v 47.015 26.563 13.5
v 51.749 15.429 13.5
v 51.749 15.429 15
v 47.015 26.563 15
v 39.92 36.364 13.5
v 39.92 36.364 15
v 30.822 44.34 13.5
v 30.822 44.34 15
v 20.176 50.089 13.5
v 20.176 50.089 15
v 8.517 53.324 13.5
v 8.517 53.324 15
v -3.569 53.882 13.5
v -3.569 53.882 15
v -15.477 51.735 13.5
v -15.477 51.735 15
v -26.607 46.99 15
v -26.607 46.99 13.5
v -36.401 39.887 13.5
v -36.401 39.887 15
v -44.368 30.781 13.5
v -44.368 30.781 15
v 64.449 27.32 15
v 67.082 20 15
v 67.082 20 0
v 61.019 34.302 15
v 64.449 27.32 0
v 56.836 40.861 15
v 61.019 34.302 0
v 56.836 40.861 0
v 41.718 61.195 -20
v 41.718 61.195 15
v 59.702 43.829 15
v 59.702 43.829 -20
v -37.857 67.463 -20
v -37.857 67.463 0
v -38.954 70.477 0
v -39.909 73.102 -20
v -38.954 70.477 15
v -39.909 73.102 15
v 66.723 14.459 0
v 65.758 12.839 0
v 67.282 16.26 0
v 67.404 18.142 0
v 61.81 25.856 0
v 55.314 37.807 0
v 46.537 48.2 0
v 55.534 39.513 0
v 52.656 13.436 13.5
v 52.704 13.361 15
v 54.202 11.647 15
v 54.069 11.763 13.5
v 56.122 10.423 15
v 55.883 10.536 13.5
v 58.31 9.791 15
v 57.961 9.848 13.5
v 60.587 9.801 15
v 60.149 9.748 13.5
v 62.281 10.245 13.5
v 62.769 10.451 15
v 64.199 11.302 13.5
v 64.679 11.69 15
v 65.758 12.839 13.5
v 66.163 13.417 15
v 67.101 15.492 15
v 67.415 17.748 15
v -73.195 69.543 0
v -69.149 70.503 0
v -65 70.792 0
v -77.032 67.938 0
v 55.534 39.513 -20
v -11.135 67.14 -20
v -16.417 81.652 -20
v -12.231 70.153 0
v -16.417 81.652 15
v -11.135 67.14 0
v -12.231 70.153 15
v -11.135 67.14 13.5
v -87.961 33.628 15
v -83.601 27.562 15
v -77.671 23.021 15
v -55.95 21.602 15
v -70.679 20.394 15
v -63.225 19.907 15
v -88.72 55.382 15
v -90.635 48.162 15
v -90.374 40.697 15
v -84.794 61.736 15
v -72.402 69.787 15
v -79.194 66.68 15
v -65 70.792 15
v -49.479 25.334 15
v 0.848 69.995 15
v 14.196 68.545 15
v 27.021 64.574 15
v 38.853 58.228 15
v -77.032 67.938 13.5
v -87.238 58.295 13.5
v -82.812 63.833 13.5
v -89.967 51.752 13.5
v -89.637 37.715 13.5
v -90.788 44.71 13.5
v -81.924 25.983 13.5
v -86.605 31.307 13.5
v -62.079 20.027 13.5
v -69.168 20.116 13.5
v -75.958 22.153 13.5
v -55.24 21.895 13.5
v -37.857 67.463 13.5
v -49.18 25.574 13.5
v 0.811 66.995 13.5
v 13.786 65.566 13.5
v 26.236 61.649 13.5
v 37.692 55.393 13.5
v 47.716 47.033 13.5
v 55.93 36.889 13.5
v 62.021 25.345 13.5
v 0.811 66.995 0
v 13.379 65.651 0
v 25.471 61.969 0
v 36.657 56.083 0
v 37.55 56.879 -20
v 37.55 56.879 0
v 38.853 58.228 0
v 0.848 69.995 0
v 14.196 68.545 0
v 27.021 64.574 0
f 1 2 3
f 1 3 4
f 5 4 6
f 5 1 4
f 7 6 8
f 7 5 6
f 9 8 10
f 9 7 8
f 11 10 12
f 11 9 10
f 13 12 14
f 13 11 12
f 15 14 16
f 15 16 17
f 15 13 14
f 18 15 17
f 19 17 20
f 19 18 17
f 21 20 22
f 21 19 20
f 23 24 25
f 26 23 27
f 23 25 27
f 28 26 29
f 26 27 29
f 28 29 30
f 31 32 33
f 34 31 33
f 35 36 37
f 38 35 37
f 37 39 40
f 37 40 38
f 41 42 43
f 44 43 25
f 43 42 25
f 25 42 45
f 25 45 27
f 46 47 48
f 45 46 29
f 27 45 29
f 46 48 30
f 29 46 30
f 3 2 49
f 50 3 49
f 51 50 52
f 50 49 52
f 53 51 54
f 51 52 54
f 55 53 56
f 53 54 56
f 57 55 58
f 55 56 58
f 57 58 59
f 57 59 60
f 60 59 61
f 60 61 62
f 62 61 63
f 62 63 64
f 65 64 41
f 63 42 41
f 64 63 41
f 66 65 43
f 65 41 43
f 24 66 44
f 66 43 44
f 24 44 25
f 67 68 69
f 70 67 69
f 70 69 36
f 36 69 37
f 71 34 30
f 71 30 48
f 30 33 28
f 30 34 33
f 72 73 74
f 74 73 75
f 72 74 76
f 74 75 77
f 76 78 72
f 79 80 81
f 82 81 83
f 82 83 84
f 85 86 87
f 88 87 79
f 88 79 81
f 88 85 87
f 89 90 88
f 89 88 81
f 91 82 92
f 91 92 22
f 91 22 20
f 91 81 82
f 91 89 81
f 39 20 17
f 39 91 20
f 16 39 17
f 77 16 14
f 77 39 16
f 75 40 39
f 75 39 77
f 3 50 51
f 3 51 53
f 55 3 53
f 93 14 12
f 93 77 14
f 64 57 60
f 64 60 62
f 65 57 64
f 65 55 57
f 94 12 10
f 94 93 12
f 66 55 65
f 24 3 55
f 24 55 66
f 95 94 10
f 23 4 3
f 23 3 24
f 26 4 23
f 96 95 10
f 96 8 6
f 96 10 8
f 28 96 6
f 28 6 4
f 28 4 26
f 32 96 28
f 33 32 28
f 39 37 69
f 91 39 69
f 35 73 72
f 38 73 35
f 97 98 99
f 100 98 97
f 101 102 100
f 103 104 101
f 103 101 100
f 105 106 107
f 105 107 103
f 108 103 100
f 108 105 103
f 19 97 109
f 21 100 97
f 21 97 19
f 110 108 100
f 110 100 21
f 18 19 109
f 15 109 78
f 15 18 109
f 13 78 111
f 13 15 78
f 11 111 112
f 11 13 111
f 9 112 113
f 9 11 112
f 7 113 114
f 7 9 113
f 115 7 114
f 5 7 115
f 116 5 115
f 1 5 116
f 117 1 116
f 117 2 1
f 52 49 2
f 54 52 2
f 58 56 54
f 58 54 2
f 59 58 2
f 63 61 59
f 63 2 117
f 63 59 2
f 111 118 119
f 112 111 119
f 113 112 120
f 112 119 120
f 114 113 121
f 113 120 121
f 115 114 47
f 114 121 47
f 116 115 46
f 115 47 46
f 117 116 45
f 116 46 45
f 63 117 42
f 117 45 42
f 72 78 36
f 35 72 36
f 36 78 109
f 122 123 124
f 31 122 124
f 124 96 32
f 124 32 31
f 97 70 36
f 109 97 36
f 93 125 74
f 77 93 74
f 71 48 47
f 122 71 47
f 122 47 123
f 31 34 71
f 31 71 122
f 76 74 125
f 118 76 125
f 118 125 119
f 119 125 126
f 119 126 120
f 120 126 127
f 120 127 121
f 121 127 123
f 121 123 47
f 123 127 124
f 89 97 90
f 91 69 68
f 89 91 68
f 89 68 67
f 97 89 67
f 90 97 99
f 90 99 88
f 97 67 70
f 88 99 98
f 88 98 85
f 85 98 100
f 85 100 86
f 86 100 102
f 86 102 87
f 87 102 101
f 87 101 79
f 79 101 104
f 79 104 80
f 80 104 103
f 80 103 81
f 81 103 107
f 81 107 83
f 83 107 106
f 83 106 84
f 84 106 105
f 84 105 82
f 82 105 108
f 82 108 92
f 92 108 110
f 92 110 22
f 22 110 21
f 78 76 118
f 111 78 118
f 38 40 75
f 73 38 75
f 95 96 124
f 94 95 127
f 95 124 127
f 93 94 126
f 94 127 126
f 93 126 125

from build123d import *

# Parameters (mm, degrees)
PAD_DEPTH       = 15
SKETCH002_R     = 67
POCKET_DEPTH    = 13.5
POCKET001_DEPTH = 13.5
PAD001_DEPTH    = 35
PAD002_DEPTH    = 35


with BuildPart() as part:
    # Sketch001 → Pad (new body)
    with BuildSketch(Plane.XY):
        with BuildLine():
            ThreePointArc((67.082039, 20), (42.17208, 55.870526), (0.847707, 69.994867))
            Line((0.847707, 69.994867), (-65, 70.792348))
            ThreePointArc((-65, 70.792348), (-87.960697, 33.627781), (-44.368352, 30.780665))
            ThreePointArc((51.749002, 15.428571), (8.517053, 53.324102), (-44.368352, 30.780665))
            ThreePointArc((51.749002, 15.428571), (61.701235, 10.047767), (67.082039, 20))
        make_face()
    extrude(amount=PAD_DEPTH)

    # Sketch002 → Pocket (cut)
    with BuildSketch(Plane(origin=(0, 0, 0), x_dir=(1, 0, 0), z_dir=(0, 0, -1))):
        Circle(SKETCH002_R)
    extrude(amount=-POCKET_DEPTH, mode=Mode.SUBTRACT)

    # Sketch003 → Pocket001 (cut)
    with BuildSketch(Plane(origin=(0, 0, 0), x_dir=(1, 0, 0), z_dir=(0, 0, -1))):
        Polygon((-152.534362, -68.852256), (0.811393, -66.995087), (-35.4631, 35.7409), align=None)
    extrude(amount=-POCKET001_DEPTH, mode=Mode.SUBTRACT)

    # Sketch005 → Pad001 (new body)
    with BuildSketch(Plane.XY.offset(15)):
        Polygon((37.550363, 56.878996), (41.718314, 61.195035), (59.701809, 43.828576), (55.533858, 39.512537), align=None)
    extrude(amount=-PAD001_DEPTH)

    # Sketch006 → Pad002 (new body)
    with BuildSketch(Plane.XY.offset(15)):
        Polygon((-37.856891, 67.463398), (-39.909012, 73.101554), (-16.416696, 81.652057), (-11.134654, 67.139765), align=None)
    extrude(amount=-PAD002_DEPTH)


solid = part.part
